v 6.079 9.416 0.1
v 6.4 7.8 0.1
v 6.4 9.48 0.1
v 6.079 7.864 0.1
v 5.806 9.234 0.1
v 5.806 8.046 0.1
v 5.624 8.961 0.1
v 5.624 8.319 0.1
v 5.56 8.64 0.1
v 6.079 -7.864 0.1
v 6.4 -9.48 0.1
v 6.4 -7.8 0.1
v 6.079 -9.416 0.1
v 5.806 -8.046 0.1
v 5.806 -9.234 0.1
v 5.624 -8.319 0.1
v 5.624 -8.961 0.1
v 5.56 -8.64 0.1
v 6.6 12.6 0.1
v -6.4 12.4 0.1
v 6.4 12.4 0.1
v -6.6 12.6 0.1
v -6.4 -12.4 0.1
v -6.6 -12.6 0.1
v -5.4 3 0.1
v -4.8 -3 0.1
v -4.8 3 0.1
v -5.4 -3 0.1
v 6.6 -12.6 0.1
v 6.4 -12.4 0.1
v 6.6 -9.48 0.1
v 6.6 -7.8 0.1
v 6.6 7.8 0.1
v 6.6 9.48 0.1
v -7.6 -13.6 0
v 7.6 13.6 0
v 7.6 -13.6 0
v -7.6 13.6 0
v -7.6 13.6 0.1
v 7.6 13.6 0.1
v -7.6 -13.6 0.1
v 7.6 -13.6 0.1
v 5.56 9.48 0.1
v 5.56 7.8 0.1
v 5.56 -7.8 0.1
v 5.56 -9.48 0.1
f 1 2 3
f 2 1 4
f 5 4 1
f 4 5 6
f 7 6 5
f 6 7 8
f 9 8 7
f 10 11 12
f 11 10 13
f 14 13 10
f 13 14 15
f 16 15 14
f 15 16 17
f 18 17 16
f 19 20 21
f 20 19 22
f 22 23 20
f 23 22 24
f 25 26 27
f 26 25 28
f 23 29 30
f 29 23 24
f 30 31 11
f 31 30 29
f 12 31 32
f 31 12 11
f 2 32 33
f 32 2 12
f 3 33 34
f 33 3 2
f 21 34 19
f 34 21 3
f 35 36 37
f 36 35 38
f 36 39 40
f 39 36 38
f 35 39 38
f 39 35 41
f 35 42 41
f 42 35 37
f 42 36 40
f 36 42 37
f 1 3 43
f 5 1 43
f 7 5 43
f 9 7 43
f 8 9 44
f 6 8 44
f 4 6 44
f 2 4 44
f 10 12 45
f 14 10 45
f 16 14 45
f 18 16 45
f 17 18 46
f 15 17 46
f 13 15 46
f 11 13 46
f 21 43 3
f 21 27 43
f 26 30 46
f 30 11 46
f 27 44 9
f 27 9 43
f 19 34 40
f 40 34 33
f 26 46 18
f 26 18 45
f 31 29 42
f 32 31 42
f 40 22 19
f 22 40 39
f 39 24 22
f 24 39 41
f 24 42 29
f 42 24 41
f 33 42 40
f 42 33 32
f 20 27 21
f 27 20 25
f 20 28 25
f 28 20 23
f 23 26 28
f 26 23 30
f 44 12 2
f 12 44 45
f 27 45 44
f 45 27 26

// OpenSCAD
// file: ../p/box5-12.scad
use <../lib.scad>
function ldraw_lib__box5_12() = [
// 0 Box with 5 Faces without Any Edges
// 0 Name: box5-12.dat
// 0 Author: Chris Dee [cwdee]
// 0 !LDRAW_ORG Primitive UPDATE 2009-02
// 0 !LICENSE Licensed under CC BY 2.0 and CC BY 4.0 : see CAreadme.txt
// 
// 0 BFC CERTIFY CCW
  [0,"BFC","CERTIFY"],
  [0,"BFC","CCW"],
// 
// 0 !HISTORY 2009-09-03 [PTadmin] Official Update 2009-02
// 
// 
// 4 16 1 1 1 1 1 -1 -1 1 -1 -1 1 1
  [4,16,1,1,1,1,1,-1,-1,1,-1,-1,1,1],
// 4 16 -1 0 1 1 0 1 1 1 1 -1 1 1
  [4,16,-1,0,1,1,0,1,1,1,1,-1,1,1],
// 4 16 -1 0 -1 -1 0 1 -1 1 1 -1 1 -1
  [4,16,-1,0,-1,-1,0,1,-1,1,1,-1,1,-1],
// 4 16 1 0 -1 -1 0 -1 -1 1 -1 1 1 -1
  [4,16,1,0,-1,-1,0,-1,-1,1,-1,1,1,-1],
// 4 16 1 0 1 1 0 -1 1 1 -1 1 1 1
  [4,16,1,0,1,1,0,-1,1,1,-1,1,1,1],
// 0
];
module ldraw_lib__box5_12(step=0, col=false, unit=2/5, alt=false, line=0.2, solid=!$preview)
    makepoly(ldraw_lib__box5_12(), step=step, col=col, unit=unit, alt=alt, line=line, solid=solid);
ldraw_lib__box5_12(line=0.2);
// file: ../p/2-4ndis.scad
use <../lib.scad>
function ldraw_lib__2_4ndis() = [
// 0 Disc Negative 0.5
// 0 Name: 2-4ndis.dat
// 0 Author: James Jessiman
// 0 !LDRAW_ORG Primitive UPDATE 2012-01
// 0 !LICENSE Licensed under CC BY 2.0 and CC BY 4.0 : see CAreadme.txt
// 
// 0 BFC CERTIFY CCW
  [0,"BFC","CERTIFY"],
  [0,"BFC","CCW"],
// 
// 0 !HISTORY 2002-03-23 [sbliss] Added BFC statement; compacted code
// 0 !HISTORY 2002-04-25 [PTadmin] Official Update 2002-02
// 0 !HISTORY 2007-06-24 [PTadmin] Header formatted for Contributor Agreement
// 0 !HISTORY 2008-07-01 [PTadmin] Official Update 2008-01
// 0 !HISTORY 2012-02-16 [Philo] Changed to CCW
// 0 !HISTORY 2012-03-30 [PTadmin] Official Update 2012-01
// 
// 
// 3 16 0.9239 0 0.3827 1 0 0 1 0 1
  [3,16,0.9239,0,0.3827,1,0,0,1,0,1],
// 3 16 0.7071 0 0.7071 0.9239 0 0.3827 1 0 1
  [3,16,0.7071,0,0.7071,0.9239,0,0.3827,1,0,1],
// 3 16 0.3827 0 0.9239 0.7071 0 0.7071 1 0 1
  [3,16,0.3827,0,0.9239,0.7071,0,0.7071,1,0,1],
// 3 16 0 0 1 0.3827 0 0.9239 1 0 1
  [3,16,0,0,1,0.3827,0,0.9239,1,0,1],
// 3 16 -0.3827 0 0.9239 0 0 1 -1 0 1
  [3,16,-0.3827,0,0.9239,0,0,1,-1,0,1],
// 3 16 -0.7071 0 0.7071 -0.3827 0 0.9239 -1 0 1
  [3,16,-0.7071,0,0.7071,-0.3827,0,0.9239,-1,0,1],
// 3 16 -0.9239 0 0.3827 -0.7071 0 0.7071 -1 0 1
  [3,16,-0.9239,0,0.3827,-0.7071,0,0.7071,-1,0,1],
// 3 16 -1 0 0 -0.9239 0 0.3827 -1 0 1
  [3,16,-1,0,0,-0.9239,0,0.3827,-1,0,1],
];
module ldraw_lib__2_4ndis(step=0, col=false, unit=2/5, alt=false, line=0.2, solid=!$preview)
    makepoly(ldraw_lib__2_4ndis(), step=step, col=col, unit=unit, alt=alt, line=line, solid=solid);
ldraw_lib__2_4ndis(line=0.2);
// file: ../p/2-4chrd.scad
use <../lib.scad>
function ldraw_lib__2_4chrd() = [
// 0 Chord 0.5
// 0 Name: 2-4chrd.dat
// 0 Author: Philippe Hurbain [Philo]
// 0 !LDRAW_ORG Primitive UPDATE 2014-01
// 0 !LICENSE Licensed under CC BY 2.0 and CC BY 4.0 : see CAreadme.txt
// 
// 0 BFC CERTIFY CCW
  [0,"BFC","CERTIFY"],
  [0,"BFC","CCW"],
// 
// 0 !HISTORY 2014-06-21 [PTadmin] Official Update 2014-01
// 
// 
// 4 16 0.9239 0 0.3827 -0.9239 0 0.3827 -1 0 0 1 0 0
  [4,16,0.9239,0,0.3827,-0.9239,0,0.3827,-1,0,0,1,0,0],
// 4 16 0.7071 0 0.7071 -0.7071 0 0.7071 -0.9239 0 0.3827 0.9239 0 0.3827
  [4,16,0.7071,0,0.7071,-0.7071,0,0.7071,-0.9239,0,0.3827,0.9239,0,0.3827],
// 4 16 0.3827 0 0.9239 -0.3827 0 0.9239 -0.7071 0 0.7071 0.7071 0 0.7071
  [4,16,0.3827,0,0.9239,-0.3827,0,0.9239,-0.7071,0,0.7071,0.7071,0,0.7071],
// 3 16 0 0 1 -0.3827 0 0.9239 0.3827 0 0.9239
  [3,16,0,0,1,-0.3827,0,0.9239,0.3827,0,0.9239],
];
module ldraw_lib__2_4chrd(step=0, col=false, unit=2/5, alt=false, line=0.2, solid=!$preview)
    makepoly(ldraw_lib__2_4chrd(), step=step, col=col, unit=unit, alt=alt, line=line, solid=solid);
ldraw_lib__2_4chrd(line=0.2);
// main file
use <../lib.scad>
use <../p/2-4chrd.scad>
use <../p/2-4ndis.scad>
use <../p/box5-12.scad>
function ldraw_lib__192885a() = [
// 0 Sticker  3.4 x  1.9 with Refrigerator Door
// 0 Name: 192885a.dat
// 0 Author: Bjoern Sigve Storesund [Storesund]
// 0 !LDRAW_ORG Part UPDATE 2017-01
// 0 !LICENSE Licensed under CC BY 2.0 and CC BY 4.0 : see CAreadme.txt
// 
// 0 BFC CERTIFY CCW
  [0,"BFC","CERTIFY"],
  [0,"BFC","CCW"],
// 
// 0 !KEYWORDS Set 6365
// 
// 0 !HISTORY 2017-12-30 [PTadmin] Official Update 2017-01
// 
// 
// 1 0 16 -0.25 21.6 0 0 -2.1 0 1 0 2.1 0 0 2-4chrd.dat
  [1,0,16,-0.25,21.6,0,0,-2.1,0,1,0,2.1,0,0, ldraw_lib__2_4chrd()],
// 1 0 16 -0.25 -21.6 0 0 -2.1 0 1 0 2.1 0 0 2-4chrd.dat
  [1,0,16,-0.25,-21.6,0,0,-2.1,0,1,0,2.1,0,0, ldraw_lib__2_4chrd()],
// 4 0 -16.5 -0.25 31.5 -16 -0.25 31 16 -0.25 31 16.5 -0.25 31.5
  [4,0,-16.5,-0.25,31.5,-16,-0.25,31,16,-0.25,31,16.5,-0.25,31.5],
// 4 0 -16.5 -0.25 31.5 -16.5 -0.25 -31.5 -16 -0.25 -31 -16 -0.25 31
  [4,0,-16.5,-0.25,31.5,-16.5,-0.25,-31.5,-16,-0.25,-31,-16,-0.25,31],
// 4 0 -13.5 -.25 7.5 -13.5 -.25 -7.5 -12 -.25 -7.5 -12 -.25 7.5
  [4,0,-13.5,-.25,7.5,-13.5,-.25,-7.5,-12,-.25,-7.5,-12,-.25,7.5],
// 4 0 -16 -0.25 -31 -16.5 -0.25 -31.5 16.5 -0.25 -31.5 16 -0.25 -31
  [4,0,-16,-0.25,-31,-16.5,-0.25,-31.5,16.5,-0.25,-31.5,16,-0.25,-31],
// 4 0 16.5 -.25 -31.5 16.5 -.25 -23.7 16 -.25 -23.7 16 -.25 -31
  [4,0,16.5,-.25,-31.5,16.5,-.25,-23.7,16,-.25,-23.7,16,-.25,-31],
// 4 0 16 -.25 -19.5 16 -.25 -23.7 16.5 -.25 -23.7 16.5 -.25 -19.5
  [4,0,16,-.25,-19.5,16,-.25,-23.7,16.5,-.25,-23.7,16.5,-.25,-19.5],
// 4 0 16 -.25 19.5 16 -.25 -19.5 16.5 -.25 -19.5 16.5 -.25 19.5
  [4,0,16,-.25,19.5,16,-.25,-19.5,16.5,-.25,-19.5,16.5,-.25,19.5],
// 4 0 16 -.25 23.7 16 -.25 19.5 16.5 -.25 19.5 16.5 -.25 23.7
  [4,0,16,-.25,23.7,16,-.25,19.5,16.5,-.25,19.5,16.5,-.25,23.7],
// 4 0 16 -.25 31 16 -.25 23.7 16.5 -.25 23.7 16.5 -.25 31.5
  [4,0,16,-.25,31,16,-.25,23.7,16.5,-.25,23.7,16.5,-.25,31.5],
// 1 16 0 -0.25 0 19 0 0 0 0.25 0 0 0 34 box5-12.dat
  [1,16,0,-0.25,0,19,0,0,0,0.25,0,0,0,34, ldraw_lib__box5_12()],
// 1 16 16 -0.25 21.6 0 0 -2.1 0 1 0 2.1 0 0 2-4ndis.dat
  [1,16,16,-0.25,21.6,0,0,-2.1,0,1,0,2.1,0,0, ldraw_lib__2_4ndis()],
// 1 16 16 -0.25 -21.6 0 0 -2.1 0 1 0 2.1 0 0 2-4ndis.dat
  [1,16,16,-0.25,-21.6,0,0,-2.1,0,1,0,2.1,0,0, ldraw_lib__2_4ndis()],
// 3 16 16 -.25 31 13.9 -.25 23.7 16 -.25 23.7
  [3,16,16,-.25,31,13.9,-.25,23.7,16,-.25,23.7],
// 3 16 16 -.25 31 -12 -.25 7.5 13.9 -.25 23.7
  [3,16,16,-.25,31,-12,-.25,7.5,13.9,-.25,23.7],
// 3 16 -12 -.25 -7.5 16 -.25 -31 13.9 -.25 -23.7
  [3,16,-12,-.25,-7.5,16,-.25,-31,13.9,-.25,-23.7],
// 3 16 16 -0.25 -31 16 -.25 -23.7 13.9 -.25 -23.7
  [3,16,16,-0.25,-31,16,-.25,-23.7,13.9,-.25,-23.7],
// 3 16 -12 -.25 7.5 13.9 -.25 19.5 13.9 -.25 21.6
  [3,16,-12,-.25,7.5,13.9,-.25,19.5,13.9,-.25,21.6],
// 3 16 -12 -.25 7.5 13.9 -.25 21.6 13.9 -.25 23.7
  [3,16,-12,-.25,7.5,13.9,-.25,21.6,13.9,-.25,23.7],
// 3 16 16.5 -.25 31.5 16.5 -.25 23.7 19 -.25 34
  [3,16,16.5,-.25,31.5,16.5,-.25,23.7,19,-.25,34],
// 3 16 19 -.25 34 16.5 -.25 23.7 16.5 -.25 19.5
  [3,16,19,-.25,34,16.5,-.25,23.7,16.5,-.25,19.5],
// 3 16 -12 -.25 -7.5 13.9 -.25 -23.7 13.9 -.25 -21.6
  [3,16,-12,-.25,-7.5,13.9,-.25,-23.7,13.9,-.25,-21.6],
// 3 16 -12 -.25 -7.5 13.9 -.25 -21.6 13.9 -.25 -19.5
  [3,16,-12,-.25,-7.5,13.9,-.25,-21.6,13.9,-.25,-19.5],
// 3 16 16.5 -.25 -23.7 16.5 -.25 -31.5 19 -.25 -34
  [3,16,16.5,-.25,-23.7,16.5,-.25,-31.5,19,-.25,-34],
// 3 16 16.5 -.25 -19.5 16.5 -.25 -23.7 19 -.25 -34
  [3,16,16.5,-.25,-19.5,16.5,-.25,-23.7,19,-.25,-34],
// 4 16 19 -0.25 34 -19 -0.25 34 -16.5 -0.25 31.5 16.5 -0.25 31.5
  [4,16,19,-0.25,34,-19,-0.25,34,-16.5,-0.25,31.5,16.5,-0.25,31.5],
// 4 16 -19 -0.25 34 -19 -0.25 -34 -16.5 -0.25 -31.5 -16.5 -0.25 31.5
  [4,16,-19,-0.25,34,-19,-0.25,-34,-16.5,-0.25,-31.5,-16.5,-0.25,31.5],
// 4 16 -19 -0.25 -34 19 -0.25 -34 16.5 -0.25 -31.5 -16.5 -0.25 -31.5
  [4,16,-19,-0.25,-34,19,-0.25,-34,16.5,-0.25,-31.5,-16.5,-0.25,-31.5],
// 4 16 16.5 -.25 19.5 16.5 -.25 -19.5 19 -.25 -34 19 -.25 34
  [4,16,16.5,-.25,19.5,16.5,-.25,-19.5,19,-.25,-34,19,-.25,34],
// 4 16 -16 -0.25 31 -13.5 -.25 7.5 -12 -.25 7.5 16 -0.25 31
  [4,16,-16,-0.25,31,-13.5,-.25,7.5,-12,-.25,7.5,16,-0.25,31],
// 4 16 -16 -0.25 31 -16 -0.25 -31 -13.5 -.25 -7.5 -13.5 -.25 7.5
  [4,16,-16,-0.25,31,-16,-0.25,-31,-13.5,-.25,-7.5,-13.5,-.25,7.5],
// 4 16 -16 -0.25 -31 16 -0.25 -31 -12 -.25 -7.5 -13.5 -.25 -7.5
  [4,16,-16,-0.25,-31,16,-0.25,-31,-12,-.25,-7.5,-13.5,-.25,-7.5],
// 4 16 13.9 -.25 19.5 13.9 -.25 -19.5 16 -.25 -19.5 16 -.25 19.5
  [4,16,13.9,-.25,19.5,13.9,-.25,-19.5,16,-.25,-19.5,16,-.25,19.5],
// 4 16 13.9 -.25 19.5 -12 -.25 7.5 -12 -.25 -7.5 13.9 -.25 -19.5
  [4,16,13.9,-.25,19.5,-12,-.25,7.5,-12,-.25,-7.5,13.9,-.25,-19.5],
];
module ldraw_lib__192885a(step=0, col=false, unit=2/5, alt=false, line=0.2, solid=!$preview)
    makepoly(ldraw_lib__192885a(), step=step, col=col, unit=unit, alt=alt, line=line, solid=solid);
ldraw_lib__192885a(line=0.2);
